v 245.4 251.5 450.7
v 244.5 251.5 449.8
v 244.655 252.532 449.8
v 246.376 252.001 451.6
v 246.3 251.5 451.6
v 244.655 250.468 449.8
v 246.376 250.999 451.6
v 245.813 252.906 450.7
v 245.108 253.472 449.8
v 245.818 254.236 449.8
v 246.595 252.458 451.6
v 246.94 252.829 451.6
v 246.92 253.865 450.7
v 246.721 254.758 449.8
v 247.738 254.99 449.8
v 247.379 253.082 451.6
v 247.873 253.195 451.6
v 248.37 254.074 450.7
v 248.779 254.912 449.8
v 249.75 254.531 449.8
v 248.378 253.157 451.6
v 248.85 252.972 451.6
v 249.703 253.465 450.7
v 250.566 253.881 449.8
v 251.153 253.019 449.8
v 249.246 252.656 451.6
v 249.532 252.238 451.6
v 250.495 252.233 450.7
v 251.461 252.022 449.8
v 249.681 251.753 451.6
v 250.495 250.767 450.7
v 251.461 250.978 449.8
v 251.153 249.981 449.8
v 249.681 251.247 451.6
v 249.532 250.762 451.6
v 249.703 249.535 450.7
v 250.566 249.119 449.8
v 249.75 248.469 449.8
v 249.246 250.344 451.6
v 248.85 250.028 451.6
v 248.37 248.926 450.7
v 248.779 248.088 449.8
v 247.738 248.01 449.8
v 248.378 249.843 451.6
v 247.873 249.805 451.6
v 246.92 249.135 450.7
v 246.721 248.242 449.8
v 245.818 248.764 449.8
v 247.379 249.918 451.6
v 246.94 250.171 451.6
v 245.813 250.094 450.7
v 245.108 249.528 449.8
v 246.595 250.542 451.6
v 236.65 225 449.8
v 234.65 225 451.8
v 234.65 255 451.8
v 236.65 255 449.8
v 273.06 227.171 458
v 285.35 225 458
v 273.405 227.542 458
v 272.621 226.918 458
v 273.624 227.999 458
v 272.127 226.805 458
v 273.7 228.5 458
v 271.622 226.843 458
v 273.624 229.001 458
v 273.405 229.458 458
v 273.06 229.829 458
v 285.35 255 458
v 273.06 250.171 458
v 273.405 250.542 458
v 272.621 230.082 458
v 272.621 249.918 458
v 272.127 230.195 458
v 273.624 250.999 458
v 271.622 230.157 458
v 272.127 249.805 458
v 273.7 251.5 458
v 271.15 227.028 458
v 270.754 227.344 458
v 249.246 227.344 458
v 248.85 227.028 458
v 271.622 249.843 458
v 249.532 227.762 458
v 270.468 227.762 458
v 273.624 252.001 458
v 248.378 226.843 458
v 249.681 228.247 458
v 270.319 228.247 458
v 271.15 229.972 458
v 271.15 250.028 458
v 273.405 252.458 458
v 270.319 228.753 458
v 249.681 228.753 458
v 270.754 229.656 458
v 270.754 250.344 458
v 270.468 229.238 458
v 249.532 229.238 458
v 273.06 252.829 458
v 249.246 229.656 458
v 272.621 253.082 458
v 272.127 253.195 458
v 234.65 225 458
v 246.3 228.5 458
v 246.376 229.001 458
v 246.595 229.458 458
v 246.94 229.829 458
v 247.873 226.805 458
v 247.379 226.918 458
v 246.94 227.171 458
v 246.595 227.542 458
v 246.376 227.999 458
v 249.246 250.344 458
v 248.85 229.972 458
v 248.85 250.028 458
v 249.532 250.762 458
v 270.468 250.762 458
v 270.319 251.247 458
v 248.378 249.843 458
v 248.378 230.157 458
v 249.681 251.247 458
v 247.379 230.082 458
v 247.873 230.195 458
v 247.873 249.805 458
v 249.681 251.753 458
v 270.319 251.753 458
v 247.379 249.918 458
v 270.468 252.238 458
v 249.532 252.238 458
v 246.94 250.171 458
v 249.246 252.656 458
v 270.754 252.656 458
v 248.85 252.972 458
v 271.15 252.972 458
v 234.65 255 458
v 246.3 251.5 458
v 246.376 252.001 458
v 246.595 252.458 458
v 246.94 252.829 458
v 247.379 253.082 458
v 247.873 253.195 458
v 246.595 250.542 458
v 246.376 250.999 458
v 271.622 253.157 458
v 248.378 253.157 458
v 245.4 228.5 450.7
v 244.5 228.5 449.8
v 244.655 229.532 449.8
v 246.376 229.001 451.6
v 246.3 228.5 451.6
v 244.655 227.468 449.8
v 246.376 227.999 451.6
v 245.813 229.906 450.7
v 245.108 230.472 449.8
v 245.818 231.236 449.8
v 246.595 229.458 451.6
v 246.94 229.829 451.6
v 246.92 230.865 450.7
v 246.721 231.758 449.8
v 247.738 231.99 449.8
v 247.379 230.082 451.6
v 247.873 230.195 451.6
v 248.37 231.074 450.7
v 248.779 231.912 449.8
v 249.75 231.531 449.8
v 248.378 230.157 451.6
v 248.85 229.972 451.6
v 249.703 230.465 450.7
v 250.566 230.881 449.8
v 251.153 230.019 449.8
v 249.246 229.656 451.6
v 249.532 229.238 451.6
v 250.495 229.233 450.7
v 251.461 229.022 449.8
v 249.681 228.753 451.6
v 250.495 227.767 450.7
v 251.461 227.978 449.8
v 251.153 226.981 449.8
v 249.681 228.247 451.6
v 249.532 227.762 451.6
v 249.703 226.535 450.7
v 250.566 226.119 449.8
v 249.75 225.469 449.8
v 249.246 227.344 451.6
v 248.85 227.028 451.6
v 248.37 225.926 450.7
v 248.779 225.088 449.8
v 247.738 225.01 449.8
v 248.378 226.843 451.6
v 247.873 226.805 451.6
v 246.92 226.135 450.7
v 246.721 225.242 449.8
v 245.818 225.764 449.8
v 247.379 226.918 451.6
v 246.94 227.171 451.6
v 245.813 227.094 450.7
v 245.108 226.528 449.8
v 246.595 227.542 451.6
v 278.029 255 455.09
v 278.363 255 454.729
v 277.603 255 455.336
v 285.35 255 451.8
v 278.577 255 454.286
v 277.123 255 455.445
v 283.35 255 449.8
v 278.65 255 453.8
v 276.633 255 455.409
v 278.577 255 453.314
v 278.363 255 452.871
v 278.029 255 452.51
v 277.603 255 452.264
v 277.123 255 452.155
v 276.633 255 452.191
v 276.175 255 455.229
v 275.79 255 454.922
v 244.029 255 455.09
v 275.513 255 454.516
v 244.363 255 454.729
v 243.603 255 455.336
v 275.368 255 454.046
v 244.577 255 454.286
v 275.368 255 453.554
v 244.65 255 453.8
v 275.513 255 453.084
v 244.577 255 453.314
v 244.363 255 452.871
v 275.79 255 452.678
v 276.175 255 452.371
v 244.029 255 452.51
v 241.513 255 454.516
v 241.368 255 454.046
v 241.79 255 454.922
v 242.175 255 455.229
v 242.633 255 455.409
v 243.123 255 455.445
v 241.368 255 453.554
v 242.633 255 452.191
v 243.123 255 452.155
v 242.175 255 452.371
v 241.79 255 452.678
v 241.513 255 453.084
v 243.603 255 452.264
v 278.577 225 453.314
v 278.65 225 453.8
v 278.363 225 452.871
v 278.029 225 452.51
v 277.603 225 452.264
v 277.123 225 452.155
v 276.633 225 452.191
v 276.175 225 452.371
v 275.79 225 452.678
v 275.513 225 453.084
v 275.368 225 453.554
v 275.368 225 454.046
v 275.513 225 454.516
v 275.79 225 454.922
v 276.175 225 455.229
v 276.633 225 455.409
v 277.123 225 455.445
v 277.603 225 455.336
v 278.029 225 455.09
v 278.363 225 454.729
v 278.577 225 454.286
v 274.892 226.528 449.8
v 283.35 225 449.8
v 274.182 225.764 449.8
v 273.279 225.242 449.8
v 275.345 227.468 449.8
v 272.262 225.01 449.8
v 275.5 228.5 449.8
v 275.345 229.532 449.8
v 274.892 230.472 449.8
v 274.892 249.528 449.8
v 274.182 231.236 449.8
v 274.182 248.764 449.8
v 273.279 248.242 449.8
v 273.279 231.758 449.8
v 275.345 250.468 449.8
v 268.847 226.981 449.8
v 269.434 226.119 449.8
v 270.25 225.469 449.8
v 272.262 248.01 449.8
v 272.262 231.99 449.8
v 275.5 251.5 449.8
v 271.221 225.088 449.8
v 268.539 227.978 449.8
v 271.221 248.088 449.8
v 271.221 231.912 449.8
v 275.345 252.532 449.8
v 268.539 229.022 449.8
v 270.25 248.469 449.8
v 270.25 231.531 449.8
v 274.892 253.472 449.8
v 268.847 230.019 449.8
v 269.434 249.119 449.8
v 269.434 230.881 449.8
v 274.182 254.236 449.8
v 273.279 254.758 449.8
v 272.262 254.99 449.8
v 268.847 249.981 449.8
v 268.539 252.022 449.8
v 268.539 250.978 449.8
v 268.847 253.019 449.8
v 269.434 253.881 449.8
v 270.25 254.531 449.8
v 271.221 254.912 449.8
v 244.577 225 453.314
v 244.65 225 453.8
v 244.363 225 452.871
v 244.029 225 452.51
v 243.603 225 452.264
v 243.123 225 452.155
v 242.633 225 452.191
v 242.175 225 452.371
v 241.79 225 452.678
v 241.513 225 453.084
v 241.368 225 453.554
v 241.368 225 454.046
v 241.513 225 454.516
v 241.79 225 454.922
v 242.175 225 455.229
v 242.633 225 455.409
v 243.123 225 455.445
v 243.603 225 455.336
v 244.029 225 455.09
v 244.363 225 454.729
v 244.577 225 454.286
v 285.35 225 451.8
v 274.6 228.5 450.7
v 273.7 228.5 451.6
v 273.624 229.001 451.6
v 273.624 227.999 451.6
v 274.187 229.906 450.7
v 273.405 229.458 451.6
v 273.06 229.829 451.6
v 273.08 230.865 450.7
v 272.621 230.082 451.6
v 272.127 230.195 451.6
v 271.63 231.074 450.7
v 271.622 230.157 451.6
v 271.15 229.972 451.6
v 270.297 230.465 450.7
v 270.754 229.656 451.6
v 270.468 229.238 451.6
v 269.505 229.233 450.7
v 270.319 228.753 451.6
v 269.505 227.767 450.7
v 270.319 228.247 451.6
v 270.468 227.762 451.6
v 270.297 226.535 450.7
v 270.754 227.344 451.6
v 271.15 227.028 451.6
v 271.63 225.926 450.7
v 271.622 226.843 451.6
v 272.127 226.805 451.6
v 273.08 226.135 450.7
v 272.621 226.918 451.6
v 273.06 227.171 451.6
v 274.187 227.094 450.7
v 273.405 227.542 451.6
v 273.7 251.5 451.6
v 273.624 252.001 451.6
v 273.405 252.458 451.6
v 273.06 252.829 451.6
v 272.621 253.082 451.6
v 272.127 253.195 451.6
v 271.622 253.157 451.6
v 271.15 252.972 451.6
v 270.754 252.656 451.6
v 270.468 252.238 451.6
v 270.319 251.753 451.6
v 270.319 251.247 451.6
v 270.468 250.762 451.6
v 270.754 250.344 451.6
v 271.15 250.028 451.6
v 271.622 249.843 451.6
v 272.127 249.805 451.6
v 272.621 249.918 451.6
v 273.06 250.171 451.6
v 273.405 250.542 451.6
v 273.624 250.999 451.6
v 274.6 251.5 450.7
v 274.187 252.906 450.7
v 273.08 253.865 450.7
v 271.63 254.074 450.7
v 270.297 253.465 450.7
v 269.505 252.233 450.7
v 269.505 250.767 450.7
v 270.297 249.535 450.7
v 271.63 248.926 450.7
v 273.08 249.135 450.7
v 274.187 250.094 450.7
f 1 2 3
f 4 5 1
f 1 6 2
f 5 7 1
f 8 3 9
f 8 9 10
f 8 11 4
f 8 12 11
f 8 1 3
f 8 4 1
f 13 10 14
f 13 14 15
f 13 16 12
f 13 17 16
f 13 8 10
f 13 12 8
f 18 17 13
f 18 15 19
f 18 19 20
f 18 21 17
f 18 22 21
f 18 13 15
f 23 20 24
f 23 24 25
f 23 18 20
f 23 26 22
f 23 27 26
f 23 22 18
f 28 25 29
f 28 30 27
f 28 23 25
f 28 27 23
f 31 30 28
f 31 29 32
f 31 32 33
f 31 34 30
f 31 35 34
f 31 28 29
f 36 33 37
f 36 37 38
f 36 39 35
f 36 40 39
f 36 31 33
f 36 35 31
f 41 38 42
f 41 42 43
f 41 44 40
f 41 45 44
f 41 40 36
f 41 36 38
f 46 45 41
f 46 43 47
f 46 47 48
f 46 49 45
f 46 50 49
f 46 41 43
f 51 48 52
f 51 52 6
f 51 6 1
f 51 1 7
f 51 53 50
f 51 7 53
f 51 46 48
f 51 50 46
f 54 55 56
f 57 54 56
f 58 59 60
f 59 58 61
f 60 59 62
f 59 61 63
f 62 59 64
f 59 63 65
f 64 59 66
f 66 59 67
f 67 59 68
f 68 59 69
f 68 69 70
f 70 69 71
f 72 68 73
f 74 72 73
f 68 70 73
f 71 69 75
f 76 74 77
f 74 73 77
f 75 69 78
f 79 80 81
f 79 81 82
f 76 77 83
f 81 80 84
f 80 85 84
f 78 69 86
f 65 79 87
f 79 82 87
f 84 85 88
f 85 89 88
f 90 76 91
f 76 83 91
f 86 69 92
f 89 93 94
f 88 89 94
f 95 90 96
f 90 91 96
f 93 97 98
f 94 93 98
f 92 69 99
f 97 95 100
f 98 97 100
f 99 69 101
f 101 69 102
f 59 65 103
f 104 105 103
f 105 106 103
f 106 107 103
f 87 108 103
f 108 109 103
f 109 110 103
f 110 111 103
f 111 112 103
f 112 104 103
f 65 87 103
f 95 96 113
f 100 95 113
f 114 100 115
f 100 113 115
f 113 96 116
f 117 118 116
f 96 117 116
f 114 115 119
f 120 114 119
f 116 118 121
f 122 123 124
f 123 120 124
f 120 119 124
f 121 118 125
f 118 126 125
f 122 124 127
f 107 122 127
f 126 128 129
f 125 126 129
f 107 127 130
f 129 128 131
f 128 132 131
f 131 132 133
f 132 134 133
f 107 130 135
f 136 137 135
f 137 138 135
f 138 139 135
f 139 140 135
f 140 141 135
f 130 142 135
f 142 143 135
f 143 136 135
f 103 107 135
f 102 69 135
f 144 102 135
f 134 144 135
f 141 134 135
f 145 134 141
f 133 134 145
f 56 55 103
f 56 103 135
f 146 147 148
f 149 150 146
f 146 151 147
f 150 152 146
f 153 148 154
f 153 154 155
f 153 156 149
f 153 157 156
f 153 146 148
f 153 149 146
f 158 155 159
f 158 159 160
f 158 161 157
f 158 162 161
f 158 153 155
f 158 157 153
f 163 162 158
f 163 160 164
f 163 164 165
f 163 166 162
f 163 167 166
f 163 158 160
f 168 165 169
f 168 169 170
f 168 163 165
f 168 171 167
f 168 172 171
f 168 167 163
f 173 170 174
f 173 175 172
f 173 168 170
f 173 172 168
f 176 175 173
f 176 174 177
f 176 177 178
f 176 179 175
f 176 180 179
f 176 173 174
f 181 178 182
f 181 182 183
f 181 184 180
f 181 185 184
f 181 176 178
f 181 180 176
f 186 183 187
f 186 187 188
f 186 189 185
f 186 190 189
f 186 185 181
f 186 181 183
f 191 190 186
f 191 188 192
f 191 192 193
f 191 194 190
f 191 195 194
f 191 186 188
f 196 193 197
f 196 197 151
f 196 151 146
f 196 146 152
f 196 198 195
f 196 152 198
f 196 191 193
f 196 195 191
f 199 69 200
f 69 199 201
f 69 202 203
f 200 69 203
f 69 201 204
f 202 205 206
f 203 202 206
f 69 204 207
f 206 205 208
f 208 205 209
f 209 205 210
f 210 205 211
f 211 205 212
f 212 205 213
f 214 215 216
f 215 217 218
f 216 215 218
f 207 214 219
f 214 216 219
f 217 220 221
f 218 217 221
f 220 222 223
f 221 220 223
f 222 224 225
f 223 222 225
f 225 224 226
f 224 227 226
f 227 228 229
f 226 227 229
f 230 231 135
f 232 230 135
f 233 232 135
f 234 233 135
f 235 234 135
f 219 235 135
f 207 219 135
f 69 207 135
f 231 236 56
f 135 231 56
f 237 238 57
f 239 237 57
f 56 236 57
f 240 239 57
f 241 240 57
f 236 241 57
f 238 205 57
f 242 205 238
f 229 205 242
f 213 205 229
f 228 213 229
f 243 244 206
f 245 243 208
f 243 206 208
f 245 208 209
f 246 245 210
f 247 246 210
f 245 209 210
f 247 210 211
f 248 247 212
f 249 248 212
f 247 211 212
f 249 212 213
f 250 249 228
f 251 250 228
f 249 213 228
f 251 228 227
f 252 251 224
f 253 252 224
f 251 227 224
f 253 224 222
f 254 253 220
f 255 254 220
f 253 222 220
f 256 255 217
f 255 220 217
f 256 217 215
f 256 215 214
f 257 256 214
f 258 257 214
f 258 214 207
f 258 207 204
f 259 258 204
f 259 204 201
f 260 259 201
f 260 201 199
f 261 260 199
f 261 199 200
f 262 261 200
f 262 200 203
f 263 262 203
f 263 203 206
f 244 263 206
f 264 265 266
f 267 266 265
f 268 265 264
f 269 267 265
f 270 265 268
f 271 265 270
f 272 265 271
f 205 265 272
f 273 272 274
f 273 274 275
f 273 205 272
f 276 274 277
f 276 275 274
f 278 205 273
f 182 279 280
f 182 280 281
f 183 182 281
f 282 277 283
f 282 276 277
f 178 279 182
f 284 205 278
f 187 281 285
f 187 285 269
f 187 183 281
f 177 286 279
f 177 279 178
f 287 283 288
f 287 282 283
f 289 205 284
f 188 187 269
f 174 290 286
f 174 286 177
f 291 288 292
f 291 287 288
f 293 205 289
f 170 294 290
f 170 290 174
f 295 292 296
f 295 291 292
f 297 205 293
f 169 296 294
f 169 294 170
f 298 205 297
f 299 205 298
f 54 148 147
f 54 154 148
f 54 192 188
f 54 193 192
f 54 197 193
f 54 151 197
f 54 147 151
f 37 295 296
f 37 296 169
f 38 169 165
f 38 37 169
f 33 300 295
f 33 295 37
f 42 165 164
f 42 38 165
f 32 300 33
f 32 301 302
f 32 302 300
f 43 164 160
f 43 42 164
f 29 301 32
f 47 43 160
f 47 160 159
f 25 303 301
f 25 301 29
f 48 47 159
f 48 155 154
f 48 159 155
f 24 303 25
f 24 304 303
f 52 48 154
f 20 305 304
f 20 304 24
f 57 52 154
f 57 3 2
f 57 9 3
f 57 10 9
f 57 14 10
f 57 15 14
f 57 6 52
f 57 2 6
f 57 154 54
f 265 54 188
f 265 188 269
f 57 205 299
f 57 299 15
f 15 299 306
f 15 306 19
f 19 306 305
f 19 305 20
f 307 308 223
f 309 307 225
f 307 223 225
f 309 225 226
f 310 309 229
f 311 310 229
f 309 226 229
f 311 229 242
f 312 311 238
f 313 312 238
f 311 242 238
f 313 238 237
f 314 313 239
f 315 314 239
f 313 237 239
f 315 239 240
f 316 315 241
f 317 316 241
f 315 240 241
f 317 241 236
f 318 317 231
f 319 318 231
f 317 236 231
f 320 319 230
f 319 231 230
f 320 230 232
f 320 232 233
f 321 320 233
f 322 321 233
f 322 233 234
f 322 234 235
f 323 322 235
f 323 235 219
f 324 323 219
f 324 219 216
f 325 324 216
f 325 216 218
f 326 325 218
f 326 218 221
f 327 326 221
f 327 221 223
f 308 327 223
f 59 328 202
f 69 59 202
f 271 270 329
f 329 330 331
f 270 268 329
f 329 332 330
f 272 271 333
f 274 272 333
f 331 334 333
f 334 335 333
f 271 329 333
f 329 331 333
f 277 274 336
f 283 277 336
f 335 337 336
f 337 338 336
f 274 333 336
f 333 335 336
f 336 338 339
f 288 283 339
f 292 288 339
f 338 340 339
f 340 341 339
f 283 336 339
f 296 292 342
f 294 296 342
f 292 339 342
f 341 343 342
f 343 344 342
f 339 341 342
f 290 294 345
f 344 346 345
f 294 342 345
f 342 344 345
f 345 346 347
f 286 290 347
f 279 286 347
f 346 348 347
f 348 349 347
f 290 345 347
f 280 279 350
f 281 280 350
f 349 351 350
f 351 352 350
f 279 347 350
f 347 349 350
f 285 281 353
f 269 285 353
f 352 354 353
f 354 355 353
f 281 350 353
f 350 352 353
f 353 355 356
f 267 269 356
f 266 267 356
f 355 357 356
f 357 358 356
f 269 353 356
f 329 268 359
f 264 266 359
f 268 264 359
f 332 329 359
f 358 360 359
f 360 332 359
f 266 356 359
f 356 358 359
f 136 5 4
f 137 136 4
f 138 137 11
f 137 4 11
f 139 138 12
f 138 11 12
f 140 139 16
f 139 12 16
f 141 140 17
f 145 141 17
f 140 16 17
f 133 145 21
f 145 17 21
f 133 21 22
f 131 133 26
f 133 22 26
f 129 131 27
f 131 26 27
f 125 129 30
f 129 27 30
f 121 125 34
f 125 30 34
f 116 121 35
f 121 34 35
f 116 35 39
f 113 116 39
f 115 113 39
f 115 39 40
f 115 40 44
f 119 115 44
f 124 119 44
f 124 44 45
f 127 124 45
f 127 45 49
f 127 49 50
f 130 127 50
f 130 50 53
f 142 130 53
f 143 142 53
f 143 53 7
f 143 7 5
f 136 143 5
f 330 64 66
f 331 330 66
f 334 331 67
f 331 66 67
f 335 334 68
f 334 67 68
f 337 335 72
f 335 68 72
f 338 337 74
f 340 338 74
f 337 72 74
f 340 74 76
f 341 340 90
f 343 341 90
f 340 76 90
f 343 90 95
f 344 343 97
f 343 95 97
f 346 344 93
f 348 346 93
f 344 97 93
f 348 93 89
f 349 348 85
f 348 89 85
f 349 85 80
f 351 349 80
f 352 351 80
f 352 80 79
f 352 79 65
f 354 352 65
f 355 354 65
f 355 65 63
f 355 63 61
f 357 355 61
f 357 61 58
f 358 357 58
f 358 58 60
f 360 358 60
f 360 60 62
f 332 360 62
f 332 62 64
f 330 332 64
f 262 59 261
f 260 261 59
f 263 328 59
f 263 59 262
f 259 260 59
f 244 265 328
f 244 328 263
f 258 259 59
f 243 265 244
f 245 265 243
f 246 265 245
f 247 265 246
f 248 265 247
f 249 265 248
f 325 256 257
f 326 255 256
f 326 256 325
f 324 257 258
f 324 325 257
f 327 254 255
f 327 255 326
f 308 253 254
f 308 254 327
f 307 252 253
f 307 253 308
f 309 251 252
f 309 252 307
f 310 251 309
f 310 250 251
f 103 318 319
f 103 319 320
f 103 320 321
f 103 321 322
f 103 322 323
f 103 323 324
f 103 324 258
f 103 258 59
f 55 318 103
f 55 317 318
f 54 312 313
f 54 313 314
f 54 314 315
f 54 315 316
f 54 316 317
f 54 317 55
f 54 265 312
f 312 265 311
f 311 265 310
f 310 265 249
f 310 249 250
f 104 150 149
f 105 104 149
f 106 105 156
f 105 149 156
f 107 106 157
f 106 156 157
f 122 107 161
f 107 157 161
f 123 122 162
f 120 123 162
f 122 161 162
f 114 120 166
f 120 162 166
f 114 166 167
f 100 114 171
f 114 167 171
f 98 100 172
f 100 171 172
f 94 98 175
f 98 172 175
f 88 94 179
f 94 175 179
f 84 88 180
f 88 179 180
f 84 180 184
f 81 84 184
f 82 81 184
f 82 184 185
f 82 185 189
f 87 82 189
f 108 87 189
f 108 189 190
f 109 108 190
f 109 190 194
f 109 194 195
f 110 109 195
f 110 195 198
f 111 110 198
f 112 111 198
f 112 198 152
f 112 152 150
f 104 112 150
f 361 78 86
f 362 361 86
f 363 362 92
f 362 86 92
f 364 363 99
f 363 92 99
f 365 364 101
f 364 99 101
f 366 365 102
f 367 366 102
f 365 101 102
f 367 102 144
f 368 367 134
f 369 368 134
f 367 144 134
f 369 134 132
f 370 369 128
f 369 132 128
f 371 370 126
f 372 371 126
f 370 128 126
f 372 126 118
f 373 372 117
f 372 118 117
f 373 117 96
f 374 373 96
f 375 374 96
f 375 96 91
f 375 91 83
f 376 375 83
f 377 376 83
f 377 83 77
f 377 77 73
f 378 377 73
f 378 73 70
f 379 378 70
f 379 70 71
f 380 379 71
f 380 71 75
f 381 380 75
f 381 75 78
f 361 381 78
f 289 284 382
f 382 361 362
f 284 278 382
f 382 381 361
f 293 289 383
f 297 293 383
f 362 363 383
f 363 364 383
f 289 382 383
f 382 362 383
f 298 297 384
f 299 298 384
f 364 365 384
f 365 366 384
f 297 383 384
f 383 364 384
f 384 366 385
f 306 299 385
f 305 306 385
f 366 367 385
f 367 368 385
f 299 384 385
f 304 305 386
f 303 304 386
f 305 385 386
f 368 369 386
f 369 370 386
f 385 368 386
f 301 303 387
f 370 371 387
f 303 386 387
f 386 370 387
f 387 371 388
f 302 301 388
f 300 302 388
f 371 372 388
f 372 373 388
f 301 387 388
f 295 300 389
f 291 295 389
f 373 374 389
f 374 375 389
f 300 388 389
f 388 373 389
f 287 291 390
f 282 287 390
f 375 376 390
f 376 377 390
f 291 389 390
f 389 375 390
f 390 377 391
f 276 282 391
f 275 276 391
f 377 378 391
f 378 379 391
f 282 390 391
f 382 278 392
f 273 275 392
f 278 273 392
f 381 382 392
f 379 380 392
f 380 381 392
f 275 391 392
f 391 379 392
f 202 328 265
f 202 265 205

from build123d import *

# Parameters (mm, degrees)
SKETCH_1_W                  = 50.700001454
SKETCH_1_H                  = 30.000001519
EXTRUDE_1_DEPTH             = 8.20000004
HOLE_WIZARD_3_3_3_3_1_D     = 3.300000535
HOLE_WIZARD_3_3_3_3_1_DEPTH = 30.00000152
HOLE_WIZARD_3_4_3_4_1_D     = 3.4
HOLE_WIZARD_3_4_3_4_1_DEPTH = 8.20000004
HOLE_WIZARD_3_4_3_4_2_D     = 3.4
HOLE_WIZARD_3_4_3_4_2_DEPTH = 8.20000004
CHAMFER_1_SIZE              = 1.8
CHAMFER_2_SIZE2             = 2.000000328
CHAMFER_2_SIZE              = 2.000000095


with BuildPart() as part:
    # 草图1 → 凸台-拉伸1 (new body)
    with BuildSketch(Plane(origin=(0, 0, 449.800000759), x_dir=(-1, 0, 0), z_dir=(0, 0, -1))):
        with Locations((-260.000000326, 239.999999943)):
            Rectangle(SKETCH_1_W, SKETCH_1_H)
    extrude(amount=-EXTRUDE_1_DEPTH)

    # Ø3.3 (3.3) 直径孔1
    with Locations(Plane(origin=(0, 224.999999183, 0), x_dir=(-1, 0, 0), z_dir=(0, -1, 0))):
        with Locations((-277.000001292, -453.79999995), (-243.000000389, -453.799999743)):
            Hole(HOLE_WIZARD_3_3_3_3_1_D / 2, depth=HOLE_WIZARD_3_3_3_3_1_DEPTH)

    # Ø3.4 (3.4) 直径孔1
    with Locations(Plane(origin=(0, 0, 449.800000759), x_dir=(-1, 0, 0), z_dir=(0, 0, -1))):
        with Locations((-272, 251.5), (-272, 228.5)):
            Hole(HOLE_WIZARD_3_4_3_4_1_D / 2, depth=HOLE_WIZARD_3_4_3_4_1_DEPTH)

    # Ø3.4 (3.4) 直径孔2
    with Locations(Plane.XY.offset(458.0000008)):
        with Locations((248, 251.5), (248, 228.5)):
            Hole(HOLE_WIZARD_3_4_3_4_2_D / 2, depth=HOLE_WIZARD_3_4_3_4_2_DEPTH)

    # 倒角1
    chamfer_1_edges = [part.edges().sort_by_distance(p)[0] for p in [
        (270.3, 228.5, 449.800000759),
        (270.3, 251.5, 449.800000759),
        (249.7, 228.5, 449.80000076),
        (249.7, 251.5, 449.80000076),
    ]]
    chamfer(chamfer_1_edges, length=CHAMFER_1_SIZE)

    # 倒角2
    chamfer_2_edges = [part.edges().sort_by_distance(p)[0] for p in [
        (234.649999599, 239.999999942, 449.800000759),
        (285.350001053, 239.999999942, 449.800000759),
    ]]
    chamfer(chamfer_2_edges, length=CHAMFER_2_SIZE, length2=CHAMFER_2_SIZE2)


solid = part.part
